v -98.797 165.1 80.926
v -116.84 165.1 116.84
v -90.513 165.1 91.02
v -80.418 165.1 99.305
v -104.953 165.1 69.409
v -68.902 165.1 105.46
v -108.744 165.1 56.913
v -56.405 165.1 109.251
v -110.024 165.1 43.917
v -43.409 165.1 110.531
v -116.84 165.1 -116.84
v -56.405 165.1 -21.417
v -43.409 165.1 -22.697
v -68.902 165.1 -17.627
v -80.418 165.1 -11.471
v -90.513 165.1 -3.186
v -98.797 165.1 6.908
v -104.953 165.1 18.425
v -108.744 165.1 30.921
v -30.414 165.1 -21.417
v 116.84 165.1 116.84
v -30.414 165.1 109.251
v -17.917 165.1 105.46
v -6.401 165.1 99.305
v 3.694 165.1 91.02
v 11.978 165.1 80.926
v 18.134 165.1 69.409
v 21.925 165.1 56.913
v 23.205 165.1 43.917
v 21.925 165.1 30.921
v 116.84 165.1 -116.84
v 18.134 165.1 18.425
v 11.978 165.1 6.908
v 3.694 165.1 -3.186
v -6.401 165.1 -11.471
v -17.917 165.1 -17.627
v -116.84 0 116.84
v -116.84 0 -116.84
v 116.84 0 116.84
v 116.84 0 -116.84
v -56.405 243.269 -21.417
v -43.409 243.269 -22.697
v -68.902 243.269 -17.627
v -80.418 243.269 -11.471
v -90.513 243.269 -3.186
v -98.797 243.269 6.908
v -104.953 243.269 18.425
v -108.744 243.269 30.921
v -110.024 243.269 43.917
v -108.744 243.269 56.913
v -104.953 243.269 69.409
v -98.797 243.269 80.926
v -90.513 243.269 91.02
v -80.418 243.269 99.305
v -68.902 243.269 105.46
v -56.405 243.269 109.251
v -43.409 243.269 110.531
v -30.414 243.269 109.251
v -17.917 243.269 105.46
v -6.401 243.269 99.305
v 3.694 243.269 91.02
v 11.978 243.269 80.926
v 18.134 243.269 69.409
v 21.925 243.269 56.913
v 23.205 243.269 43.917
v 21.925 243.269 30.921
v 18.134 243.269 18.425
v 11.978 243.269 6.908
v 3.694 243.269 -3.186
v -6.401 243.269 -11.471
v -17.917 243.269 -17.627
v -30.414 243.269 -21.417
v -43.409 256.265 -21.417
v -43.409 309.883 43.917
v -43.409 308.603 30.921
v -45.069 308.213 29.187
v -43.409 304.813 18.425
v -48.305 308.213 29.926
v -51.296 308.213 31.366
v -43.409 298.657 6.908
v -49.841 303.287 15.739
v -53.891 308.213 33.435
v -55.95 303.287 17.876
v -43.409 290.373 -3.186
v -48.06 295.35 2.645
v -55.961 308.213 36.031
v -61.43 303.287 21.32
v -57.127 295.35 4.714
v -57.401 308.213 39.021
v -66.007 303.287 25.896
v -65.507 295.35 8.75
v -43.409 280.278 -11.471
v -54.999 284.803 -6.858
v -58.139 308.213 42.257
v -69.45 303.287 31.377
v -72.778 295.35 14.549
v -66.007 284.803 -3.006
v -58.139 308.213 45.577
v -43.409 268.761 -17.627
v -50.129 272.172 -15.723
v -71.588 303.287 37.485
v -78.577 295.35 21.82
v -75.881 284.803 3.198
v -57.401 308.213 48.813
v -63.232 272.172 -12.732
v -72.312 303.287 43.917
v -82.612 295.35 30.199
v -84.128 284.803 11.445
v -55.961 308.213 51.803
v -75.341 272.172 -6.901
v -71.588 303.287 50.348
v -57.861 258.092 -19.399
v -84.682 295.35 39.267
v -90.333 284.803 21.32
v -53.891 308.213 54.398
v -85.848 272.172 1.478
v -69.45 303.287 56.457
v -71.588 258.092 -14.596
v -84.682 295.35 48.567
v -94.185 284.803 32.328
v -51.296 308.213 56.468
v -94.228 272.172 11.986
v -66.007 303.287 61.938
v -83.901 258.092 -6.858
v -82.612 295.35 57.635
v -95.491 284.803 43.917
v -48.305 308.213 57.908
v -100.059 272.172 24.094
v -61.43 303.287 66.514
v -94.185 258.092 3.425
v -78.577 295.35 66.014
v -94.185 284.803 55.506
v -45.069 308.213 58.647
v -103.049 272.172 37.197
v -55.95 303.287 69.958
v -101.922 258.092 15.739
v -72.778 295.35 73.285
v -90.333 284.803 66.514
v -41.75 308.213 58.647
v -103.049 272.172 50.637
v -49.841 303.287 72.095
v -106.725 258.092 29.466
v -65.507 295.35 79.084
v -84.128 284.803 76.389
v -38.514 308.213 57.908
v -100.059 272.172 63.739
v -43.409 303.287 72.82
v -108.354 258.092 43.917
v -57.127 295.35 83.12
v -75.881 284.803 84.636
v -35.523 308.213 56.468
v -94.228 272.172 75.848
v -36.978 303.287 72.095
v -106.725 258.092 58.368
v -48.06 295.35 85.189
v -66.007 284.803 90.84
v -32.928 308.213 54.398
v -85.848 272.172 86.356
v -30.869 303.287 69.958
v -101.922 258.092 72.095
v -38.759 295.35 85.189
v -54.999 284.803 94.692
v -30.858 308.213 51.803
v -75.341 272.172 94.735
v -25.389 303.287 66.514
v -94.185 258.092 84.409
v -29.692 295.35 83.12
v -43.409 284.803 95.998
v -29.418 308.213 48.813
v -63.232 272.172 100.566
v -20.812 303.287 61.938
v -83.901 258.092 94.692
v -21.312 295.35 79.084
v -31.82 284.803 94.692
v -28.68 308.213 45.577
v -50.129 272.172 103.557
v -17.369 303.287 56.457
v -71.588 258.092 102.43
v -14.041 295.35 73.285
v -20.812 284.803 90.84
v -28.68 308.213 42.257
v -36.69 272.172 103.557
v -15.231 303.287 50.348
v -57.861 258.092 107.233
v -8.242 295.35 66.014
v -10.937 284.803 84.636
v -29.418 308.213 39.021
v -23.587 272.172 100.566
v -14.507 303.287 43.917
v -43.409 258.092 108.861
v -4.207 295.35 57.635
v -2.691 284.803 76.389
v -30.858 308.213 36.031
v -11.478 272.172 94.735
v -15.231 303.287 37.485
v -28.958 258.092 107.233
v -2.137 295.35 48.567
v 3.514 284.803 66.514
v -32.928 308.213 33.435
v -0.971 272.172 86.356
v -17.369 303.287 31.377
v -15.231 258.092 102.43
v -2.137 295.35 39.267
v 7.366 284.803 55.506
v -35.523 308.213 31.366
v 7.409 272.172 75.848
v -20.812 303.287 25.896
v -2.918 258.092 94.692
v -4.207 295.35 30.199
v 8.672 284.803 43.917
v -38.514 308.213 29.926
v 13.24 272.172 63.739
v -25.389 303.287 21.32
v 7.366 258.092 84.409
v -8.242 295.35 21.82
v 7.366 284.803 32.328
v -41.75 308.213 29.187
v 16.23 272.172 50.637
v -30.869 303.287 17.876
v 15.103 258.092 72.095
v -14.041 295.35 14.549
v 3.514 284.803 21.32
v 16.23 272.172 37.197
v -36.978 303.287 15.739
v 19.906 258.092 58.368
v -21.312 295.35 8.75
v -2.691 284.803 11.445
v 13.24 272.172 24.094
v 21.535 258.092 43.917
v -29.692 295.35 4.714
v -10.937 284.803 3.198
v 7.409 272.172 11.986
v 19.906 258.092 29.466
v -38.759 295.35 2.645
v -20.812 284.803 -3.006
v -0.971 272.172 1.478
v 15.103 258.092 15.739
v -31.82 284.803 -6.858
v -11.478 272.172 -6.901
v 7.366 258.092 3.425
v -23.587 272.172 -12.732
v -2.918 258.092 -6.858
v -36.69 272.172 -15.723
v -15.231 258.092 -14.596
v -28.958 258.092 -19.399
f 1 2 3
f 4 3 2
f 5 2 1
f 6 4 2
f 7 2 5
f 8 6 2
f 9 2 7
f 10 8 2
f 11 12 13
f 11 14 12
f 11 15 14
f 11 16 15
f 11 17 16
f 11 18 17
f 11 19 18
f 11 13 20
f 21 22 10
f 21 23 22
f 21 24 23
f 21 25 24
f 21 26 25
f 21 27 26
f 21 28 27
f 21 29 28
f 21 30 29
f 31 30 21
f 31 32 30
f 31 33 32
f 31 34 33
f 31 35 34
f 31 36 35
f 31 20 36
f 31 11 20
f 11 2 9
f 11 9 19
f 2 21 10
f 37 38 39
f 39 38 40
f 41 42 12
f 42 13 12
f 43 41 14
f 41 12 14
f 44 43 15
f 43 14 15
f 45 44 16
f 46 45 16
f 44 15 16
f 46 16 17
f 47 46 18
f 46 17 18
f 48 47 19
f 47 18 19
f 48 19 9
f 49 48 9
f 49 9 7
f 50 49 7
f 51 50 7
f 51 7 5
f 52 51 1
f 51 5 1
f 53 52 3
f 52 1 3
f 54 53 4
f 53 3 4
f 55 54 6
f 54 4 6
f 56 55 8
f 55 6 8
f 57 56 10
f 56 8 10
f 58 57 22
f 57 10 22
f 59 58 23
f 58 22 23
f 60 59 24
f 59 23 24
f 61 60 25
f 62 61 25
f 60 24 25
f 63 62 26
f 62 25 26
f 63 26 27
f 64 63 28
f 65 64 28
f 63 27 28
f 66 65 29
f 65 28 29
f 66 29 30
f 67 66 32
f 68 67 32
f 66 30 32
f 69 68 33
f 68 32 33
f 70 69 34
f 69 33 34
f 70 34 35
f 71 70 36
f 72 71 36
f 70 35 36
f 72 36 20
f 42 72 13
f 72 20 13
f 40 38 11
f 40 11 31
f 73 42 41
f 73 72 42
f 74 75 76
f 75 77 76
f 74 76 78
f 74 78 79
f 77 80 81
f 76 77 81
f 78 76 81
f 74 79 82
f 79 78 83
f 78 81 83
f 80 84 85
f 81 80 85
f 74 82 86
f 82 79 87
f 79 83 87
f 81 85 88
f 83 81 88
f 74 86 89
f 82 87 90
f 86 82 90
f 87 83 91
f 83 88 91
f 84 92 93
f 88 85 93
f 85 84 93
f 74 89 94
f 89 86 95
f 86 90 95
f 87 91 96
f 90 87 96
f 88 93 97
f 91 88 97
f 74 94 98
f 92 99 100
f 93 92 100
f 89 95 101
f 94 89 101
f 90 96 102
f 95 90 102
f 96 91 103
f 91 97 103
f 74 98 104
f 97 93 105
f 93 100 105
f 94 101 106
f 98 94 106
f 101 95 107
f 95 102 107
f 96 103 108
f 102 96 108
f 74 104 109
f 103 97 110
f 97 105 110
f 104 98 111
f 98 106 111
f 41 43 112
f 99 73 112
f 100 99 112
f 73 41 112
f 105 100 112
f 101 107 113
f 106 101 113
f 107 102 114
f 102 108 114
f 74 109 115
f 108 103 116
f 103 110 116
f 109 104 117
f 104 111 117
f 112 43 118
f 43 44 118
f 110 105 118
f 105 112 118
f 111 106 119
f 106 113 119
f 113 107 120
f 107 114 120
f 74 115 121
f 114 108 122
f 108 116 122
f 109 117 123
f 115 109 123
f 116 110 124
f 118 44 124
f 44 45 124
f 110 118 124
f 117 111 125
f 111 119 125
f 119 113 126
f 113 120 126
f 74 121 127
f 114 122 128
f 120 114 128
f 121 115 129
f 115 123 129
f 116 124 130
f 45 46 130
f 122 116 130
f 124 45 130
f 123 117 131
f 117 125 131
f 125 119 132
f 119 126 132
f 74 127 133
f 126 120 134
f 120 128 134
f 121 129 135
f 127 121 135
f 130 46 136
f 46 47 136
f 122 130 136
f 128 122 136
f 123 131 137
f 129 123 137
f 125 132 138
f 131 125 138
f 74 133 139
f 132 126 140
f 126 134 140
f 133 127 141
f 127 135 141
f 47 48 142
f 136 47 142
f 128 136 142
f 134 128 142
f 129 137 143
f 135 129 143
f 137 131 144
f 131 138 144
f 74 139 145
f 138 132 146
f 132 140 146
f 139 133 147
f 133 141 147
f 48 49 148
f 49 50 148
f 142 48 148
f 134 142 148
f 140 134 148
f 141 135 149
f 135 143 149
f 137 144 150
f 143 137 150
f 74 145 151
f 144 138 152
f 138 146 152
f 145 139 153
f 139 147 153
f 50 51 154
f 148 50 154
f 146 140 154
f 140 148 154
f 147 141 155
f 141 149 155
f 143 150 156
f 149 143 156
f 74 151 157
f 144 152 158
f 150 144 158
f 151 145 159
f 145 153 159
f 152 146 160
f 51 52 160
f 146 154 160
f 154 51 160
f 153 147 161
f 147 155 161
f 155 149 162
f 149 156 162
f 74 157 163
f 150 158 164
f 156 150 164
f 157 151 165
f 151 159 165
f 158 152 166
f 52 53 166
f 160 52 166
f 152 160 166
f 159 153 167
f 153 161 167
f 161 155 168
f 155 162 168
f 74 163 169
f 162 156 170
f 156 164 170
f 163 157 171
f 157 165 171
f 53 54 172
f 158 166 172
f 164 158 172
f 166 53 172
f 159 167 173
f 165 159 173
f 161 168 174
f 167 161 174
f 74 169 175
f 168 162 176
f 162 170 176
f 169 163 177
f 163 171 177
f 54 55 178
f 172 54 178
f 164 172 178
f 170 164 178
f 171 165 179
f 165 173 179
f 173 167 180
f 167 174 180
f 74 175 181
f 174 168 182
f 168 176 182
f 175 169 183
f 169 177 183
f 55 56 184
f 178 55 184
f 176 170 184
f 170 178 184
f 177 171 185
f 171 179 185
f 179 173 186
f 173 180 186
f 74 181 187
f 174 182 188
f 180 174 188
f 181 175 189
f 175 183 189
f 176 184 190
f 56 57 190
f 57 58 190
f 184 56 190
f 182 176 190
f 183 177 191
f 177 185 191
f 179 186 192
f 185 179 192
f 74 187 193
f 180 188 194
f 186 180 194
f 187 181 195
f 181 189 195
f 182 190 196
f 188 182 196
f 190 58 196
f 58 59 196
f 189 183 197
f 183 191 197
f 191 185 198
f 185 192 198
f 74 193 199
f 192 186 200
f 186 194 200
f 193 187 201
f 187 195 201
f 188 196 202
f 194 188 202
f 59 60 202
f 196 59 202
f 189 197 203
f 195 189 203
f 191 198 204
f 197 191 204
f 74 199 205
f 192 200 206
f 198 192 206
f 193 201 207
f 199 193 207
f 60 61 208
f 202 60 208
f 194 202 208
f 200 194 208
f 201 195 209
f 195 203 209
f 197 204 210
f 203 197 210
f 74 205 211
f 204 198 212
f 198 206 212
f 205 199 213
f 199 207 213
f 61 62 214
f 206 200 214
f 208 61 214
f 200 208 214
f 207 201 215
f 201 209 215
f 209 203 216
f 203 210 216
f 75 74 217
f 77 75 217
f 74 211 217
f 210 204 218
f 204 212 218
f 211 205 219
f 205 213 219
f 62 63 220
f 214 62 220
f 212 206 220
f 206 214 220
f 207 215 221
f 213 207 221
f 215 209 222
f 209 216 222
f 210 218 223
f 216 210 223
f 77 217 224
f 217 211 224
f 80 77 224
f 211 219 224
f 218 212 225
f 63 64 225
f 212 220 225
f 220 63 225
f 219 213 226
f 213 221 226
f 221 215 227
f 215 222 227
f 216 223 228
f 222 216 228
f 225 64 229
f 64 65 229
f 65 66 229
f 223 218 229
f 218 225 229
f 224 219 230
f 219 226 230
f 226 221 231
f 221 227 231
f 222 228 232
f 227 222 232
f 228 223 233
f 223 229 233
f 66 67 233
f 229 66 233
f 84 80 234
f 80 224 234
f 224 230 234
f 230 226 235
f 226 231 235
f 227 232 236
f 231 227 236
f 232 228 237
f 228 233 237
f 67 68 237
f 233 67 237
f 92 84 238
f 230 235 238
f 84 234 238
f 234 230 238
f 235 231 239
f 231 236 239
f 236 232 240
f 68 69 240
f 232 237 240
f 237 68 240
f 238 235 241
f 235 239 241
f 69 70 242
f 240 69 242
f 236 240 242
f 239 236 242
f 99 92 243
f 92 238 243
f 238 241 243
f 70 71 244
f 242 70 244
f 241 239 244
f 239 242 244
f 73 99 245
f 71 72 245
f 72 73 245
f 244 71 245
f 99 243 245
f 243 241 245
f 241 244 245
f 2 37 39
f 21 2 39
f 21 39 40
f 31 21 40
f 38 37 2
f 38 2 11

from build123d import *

# Parameters (mm, degrees)
SKETCH1_W           = 233.68
SKETCH1_H           = 233.68
BOSS_EXTRUDE1_DEPTH = 165.1


with BuildPart() as part:
    # Sketch1 → Boss-Extrude1 (new body)
    with BuildSketch(Plane(origin=(0, 0, 0), x_dir=(1, 0, 0), z_dir=(0, 1, 0))):
        Rectangle(SKETCH1_W, SKETCH1_H)
    extrude(amount=BOSS_EXTRUDE1_DEPTH)

    # Sketch3 → Revolve1 (revolve)
    with BuildSketch(Plane.YZ.offset(-43.40946291)):
        with BuildLine():
            Line((165.1, 43.916968586), (309.883452069, 43.916968586))
            ThreePointArc((309.883452069, 43.916968586), (290.37259982, -3.186395526), (243.269235708, -22.697247775))
            Line((243.269235708, -22.697247775), (165.1, -22.697247775))
            Line((165.1, -22.697247775), (165.1, 43.916968586))
        make_face()
    revolve(axis=Axis((-43.40946291, 165.1, 43.916968586), (0, 1, 0)))


solid = part.part
